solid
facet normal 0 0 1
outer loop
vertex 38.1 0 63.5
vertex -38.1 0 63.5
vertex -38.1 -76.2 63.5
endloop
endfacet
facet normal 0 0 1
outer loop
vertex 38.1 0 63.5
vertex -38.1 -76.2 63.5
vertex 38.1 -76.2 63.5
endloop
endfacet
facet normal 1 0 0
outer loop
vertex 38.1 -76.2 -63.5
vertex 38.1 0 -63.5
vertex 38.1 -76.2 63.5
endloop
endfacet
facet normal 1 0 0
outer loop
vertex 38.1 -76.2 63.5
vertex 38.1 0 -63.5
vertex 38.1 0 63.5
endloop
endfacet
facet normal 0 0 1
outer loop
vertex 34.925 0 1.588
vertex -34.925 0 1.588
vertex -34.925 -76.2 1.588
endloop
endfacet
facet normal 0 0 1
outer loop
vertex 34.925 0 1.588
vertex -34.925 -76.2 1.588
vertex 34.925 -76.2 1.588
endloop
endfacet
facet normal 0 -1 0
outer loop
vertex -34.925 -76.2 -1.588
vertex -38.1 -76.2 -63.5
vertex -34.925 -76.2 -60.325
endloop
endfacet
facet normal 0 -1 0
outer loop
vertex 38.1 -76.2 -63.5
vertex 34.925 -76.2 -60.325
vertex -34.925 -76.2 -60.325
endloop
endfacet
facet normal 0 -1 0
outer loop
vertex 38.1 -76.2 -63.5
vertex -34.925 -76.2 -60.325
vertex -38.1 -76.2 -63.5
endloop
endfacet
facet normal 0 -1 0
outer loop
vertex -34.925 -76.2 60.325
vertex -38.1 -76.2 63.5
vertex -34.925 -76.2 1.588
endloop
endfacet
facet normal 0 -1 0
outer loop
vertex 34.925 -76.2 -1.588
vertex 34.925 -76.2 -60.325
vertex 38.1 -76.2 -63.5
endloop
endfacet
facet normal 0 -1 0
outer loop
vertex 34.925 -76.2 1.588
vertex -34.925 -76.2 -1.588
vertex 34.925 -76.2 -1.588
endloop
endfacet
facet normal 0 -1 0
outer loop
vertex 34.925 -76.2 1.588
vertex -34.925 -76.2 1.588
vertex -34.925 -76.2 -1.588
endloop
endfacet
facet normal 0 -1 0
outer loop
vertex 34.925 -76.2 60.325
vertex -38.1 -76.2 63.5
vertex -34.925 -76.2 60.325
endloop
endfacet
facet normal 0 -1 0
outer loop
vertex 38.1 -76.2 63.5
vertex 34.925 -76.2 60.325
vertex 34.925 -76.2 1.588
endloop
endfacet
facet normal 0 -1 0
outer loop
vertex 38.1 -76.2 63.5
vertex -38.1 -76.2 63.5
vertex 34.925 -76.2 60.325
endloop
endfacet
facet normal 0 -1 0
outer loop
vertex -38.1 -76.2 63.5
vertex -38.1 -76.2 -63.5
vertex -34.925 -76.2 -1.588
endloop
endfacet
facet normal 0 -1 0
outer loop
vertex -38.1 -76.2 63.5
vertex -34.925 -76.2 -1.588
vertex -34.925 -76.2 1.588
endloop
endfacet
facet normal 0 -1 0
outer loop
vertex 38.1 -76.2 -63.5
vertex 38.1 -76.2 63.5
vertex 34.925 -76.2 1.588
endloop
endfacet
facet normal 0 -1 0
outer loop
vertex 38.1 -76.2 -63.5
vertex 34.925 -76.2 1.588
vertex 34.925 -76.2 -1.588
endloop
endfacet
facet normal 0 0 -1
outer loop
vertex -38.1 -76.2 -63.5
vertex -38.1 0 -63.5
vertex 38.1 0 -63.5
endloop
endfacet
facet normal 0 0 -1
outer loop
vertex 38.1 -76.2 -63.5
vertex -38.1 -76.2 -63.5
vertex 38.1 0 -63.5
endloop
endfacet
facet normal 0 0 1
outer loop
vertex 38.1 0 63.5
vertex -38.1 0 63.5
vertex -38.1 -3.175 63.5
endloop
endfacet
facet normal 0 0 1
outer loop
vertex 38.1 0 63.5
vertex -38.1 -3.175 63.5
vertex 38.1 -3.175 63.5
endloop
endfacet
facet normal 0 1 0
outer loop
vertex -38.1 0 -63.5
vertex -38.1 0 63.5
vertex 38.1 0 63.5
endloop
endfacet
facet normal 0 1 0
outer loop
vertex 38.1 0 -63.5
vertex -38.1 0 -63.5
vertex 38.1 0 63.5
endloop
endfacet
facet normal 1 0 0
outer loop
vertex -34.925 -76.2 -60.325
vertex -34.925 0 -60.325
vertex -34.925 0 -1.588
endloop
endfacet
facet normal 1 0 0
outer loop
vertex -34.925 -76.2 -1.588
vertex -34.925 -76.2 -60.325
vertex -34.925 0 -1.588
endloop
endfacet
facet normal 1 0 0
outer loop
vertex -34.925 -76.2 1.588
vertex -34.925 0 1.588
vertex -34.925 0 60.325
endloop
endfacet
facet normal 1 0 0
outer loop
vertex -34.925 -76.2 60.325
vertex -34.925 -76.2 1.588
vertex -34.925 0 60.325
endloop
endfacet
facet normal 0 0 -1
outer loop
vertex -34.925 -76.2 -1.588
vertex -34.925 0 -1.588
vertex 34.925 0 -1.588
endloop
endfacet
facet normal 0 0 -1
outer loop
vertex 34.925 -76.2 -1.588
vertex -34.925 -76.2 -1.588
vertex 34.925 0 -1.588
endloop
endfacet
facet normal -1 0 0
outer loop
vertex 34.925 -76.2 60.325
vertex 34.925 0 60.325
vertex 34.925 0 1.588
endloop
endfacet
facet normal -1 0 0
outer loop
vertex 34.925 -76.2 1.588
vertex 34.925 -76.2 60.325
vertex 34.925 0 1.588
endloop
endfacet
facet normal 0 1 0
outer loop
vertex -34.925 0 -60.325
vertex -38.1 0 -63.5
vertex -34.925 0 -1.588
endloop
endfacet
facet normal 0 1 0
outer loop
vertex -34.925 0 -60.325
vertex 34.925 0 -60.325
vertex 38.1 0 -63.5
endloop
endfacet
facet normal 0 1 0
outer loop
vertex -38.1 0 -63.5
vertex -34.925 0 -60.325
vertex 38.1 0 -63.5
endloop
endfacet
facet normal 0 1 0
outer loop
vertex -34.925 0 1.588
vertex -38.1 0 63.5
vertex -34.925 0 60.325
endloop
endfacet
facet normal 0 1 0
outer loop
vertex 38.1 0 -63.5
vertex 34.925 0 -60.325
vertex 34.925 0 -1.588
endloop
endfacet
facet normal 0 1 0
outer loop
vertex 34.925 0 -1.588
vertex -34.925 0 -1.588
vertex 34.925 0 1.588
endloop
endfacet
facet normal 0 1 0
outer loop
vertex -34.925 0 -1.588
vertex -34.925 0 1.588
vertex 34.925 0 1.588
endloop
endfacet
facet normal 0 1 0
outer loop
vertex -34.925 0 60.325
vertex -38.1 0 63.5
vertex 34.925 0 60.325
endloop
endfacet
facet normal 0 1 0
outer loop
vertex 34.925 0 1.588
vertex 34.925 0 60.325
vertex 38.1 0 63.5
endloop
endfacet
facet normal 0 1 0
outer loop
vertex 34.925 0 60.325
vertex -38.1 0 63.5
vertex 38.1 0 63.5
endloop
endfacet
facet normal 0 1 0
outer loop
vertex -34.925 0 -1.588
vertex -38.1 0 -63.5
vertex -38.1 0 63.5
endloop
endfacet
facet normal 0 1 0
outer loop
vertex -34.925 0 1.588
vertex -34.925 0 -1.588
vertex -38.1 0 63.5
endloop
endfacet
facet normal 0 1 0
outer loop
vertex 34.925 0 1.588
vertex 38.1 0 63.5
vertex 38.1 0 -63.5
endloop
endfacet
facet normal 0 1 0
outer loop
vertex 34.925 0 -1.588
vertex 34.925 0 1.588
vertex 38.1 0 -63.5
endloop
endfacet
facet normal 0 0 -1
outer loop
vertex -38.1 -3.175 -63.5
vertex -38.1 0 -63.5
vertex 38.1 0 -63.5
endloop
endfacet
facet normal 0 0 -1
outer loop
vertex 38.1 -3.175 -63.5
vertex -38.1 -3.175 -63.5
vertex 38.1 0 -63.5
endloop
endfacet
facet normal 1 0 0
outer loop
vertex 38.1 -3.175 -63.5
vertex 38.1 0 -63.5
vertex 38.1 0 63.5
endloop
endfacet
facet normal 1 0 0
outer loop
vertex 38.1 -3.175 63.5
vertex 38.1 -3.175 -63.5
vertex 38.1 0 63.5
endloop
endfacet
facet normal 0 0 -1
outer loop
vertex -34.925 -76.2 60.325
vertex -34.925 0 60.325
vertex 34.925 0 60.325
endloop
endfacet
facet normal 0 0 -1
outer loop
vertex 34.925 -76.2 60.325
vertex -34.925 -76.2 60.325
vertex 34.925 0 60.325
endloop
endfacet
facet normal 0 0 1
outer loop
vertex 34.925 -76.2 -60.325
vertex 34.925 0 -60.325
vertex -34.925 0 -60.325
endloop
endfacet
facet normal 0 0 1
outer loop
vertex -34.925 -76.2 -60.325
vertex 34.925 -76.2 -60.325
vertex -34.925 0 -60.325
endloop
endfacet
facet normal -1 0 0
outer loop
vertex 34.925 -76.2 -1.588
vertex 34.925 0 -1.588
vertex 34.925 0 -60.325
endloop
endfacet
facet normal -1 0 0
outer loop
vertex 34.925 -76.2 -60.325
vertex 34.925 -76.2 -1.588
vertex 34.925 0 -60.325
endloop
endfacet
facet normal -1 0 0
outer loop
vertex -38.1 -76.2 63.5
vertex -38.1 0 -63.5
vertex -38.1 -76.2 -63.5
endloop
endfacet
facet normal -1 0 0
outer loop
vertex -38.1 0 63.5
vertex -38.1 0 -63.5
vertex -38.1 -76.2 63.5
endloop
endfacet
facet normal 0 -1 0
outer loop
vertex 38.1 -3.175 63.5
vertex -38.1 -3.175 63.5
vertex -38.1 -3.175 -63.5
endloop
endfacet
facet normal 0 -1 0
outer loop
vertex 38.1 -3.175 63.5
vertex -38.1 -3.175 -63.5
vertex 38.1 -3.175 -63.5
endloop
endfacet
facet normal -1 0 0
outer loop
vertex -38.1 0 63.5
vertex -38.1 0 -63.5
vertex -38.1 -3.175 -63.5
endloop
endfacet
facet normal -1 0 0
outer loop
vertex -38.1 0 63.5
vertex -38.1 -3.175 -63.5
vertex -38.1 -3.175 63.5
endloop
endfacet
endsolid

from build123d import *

# Parameters (mm, degrees)
F0_W     = 76.2
F0_H     = 127
F0_W_2   = 69.85
F0_H_2   = 3.175
F0_H_3   = 58.7375
F1_DEPTH = 3.175
F2_DEPTH = 76.2


with BuildPart() as f1:
    # F0 (on Front) → F1 (new body)
    with BuildSketch(Plane.XZ):
        Rectangle(F0_W, F0_H)
        Polygon((34.925, -60.325), (-34.925, -60.325), (-34.925, -1.5875), (-34.925, 1.5875), (-34.925, 60.325), (34.925, 60.325), (34.925, 1.5875), (34.925, -1.5875), align=None, mode=Mode.SUBTRACT)
        Rectangle(F0_W_2, F0_H_2)
        with Locations((0, 30.95625)):
            Rectangle(F0_W_2, F0_H_3)
        with Locations((0, -30.95625)):
            Rectangle(F0_W_2, F0_H_3)
    extrude(amount=F1_DEPTH)


with BuildPart() as f2:
    # F0 (on Front) → F2 (new body)
    with BuildSketch(Plane.XZ):
        Rectangle(F0_W, F0_H)
        Polygon((34.925, -60.325), (-34.925, -60.325), (-34.925, -1.5875), (-34.925, 1.5875), (-34.925, 60.325), (34.925, 60.325), (34.925, 1.5875), (34.925, -1.5875), align=None, mode=Mode.SUBTRACT)
        Rectangle(F0_W_2, F0_H_2)
    extrude(amount=F2_DEPTH)


solid = Compound([f1.part, f2.part])
